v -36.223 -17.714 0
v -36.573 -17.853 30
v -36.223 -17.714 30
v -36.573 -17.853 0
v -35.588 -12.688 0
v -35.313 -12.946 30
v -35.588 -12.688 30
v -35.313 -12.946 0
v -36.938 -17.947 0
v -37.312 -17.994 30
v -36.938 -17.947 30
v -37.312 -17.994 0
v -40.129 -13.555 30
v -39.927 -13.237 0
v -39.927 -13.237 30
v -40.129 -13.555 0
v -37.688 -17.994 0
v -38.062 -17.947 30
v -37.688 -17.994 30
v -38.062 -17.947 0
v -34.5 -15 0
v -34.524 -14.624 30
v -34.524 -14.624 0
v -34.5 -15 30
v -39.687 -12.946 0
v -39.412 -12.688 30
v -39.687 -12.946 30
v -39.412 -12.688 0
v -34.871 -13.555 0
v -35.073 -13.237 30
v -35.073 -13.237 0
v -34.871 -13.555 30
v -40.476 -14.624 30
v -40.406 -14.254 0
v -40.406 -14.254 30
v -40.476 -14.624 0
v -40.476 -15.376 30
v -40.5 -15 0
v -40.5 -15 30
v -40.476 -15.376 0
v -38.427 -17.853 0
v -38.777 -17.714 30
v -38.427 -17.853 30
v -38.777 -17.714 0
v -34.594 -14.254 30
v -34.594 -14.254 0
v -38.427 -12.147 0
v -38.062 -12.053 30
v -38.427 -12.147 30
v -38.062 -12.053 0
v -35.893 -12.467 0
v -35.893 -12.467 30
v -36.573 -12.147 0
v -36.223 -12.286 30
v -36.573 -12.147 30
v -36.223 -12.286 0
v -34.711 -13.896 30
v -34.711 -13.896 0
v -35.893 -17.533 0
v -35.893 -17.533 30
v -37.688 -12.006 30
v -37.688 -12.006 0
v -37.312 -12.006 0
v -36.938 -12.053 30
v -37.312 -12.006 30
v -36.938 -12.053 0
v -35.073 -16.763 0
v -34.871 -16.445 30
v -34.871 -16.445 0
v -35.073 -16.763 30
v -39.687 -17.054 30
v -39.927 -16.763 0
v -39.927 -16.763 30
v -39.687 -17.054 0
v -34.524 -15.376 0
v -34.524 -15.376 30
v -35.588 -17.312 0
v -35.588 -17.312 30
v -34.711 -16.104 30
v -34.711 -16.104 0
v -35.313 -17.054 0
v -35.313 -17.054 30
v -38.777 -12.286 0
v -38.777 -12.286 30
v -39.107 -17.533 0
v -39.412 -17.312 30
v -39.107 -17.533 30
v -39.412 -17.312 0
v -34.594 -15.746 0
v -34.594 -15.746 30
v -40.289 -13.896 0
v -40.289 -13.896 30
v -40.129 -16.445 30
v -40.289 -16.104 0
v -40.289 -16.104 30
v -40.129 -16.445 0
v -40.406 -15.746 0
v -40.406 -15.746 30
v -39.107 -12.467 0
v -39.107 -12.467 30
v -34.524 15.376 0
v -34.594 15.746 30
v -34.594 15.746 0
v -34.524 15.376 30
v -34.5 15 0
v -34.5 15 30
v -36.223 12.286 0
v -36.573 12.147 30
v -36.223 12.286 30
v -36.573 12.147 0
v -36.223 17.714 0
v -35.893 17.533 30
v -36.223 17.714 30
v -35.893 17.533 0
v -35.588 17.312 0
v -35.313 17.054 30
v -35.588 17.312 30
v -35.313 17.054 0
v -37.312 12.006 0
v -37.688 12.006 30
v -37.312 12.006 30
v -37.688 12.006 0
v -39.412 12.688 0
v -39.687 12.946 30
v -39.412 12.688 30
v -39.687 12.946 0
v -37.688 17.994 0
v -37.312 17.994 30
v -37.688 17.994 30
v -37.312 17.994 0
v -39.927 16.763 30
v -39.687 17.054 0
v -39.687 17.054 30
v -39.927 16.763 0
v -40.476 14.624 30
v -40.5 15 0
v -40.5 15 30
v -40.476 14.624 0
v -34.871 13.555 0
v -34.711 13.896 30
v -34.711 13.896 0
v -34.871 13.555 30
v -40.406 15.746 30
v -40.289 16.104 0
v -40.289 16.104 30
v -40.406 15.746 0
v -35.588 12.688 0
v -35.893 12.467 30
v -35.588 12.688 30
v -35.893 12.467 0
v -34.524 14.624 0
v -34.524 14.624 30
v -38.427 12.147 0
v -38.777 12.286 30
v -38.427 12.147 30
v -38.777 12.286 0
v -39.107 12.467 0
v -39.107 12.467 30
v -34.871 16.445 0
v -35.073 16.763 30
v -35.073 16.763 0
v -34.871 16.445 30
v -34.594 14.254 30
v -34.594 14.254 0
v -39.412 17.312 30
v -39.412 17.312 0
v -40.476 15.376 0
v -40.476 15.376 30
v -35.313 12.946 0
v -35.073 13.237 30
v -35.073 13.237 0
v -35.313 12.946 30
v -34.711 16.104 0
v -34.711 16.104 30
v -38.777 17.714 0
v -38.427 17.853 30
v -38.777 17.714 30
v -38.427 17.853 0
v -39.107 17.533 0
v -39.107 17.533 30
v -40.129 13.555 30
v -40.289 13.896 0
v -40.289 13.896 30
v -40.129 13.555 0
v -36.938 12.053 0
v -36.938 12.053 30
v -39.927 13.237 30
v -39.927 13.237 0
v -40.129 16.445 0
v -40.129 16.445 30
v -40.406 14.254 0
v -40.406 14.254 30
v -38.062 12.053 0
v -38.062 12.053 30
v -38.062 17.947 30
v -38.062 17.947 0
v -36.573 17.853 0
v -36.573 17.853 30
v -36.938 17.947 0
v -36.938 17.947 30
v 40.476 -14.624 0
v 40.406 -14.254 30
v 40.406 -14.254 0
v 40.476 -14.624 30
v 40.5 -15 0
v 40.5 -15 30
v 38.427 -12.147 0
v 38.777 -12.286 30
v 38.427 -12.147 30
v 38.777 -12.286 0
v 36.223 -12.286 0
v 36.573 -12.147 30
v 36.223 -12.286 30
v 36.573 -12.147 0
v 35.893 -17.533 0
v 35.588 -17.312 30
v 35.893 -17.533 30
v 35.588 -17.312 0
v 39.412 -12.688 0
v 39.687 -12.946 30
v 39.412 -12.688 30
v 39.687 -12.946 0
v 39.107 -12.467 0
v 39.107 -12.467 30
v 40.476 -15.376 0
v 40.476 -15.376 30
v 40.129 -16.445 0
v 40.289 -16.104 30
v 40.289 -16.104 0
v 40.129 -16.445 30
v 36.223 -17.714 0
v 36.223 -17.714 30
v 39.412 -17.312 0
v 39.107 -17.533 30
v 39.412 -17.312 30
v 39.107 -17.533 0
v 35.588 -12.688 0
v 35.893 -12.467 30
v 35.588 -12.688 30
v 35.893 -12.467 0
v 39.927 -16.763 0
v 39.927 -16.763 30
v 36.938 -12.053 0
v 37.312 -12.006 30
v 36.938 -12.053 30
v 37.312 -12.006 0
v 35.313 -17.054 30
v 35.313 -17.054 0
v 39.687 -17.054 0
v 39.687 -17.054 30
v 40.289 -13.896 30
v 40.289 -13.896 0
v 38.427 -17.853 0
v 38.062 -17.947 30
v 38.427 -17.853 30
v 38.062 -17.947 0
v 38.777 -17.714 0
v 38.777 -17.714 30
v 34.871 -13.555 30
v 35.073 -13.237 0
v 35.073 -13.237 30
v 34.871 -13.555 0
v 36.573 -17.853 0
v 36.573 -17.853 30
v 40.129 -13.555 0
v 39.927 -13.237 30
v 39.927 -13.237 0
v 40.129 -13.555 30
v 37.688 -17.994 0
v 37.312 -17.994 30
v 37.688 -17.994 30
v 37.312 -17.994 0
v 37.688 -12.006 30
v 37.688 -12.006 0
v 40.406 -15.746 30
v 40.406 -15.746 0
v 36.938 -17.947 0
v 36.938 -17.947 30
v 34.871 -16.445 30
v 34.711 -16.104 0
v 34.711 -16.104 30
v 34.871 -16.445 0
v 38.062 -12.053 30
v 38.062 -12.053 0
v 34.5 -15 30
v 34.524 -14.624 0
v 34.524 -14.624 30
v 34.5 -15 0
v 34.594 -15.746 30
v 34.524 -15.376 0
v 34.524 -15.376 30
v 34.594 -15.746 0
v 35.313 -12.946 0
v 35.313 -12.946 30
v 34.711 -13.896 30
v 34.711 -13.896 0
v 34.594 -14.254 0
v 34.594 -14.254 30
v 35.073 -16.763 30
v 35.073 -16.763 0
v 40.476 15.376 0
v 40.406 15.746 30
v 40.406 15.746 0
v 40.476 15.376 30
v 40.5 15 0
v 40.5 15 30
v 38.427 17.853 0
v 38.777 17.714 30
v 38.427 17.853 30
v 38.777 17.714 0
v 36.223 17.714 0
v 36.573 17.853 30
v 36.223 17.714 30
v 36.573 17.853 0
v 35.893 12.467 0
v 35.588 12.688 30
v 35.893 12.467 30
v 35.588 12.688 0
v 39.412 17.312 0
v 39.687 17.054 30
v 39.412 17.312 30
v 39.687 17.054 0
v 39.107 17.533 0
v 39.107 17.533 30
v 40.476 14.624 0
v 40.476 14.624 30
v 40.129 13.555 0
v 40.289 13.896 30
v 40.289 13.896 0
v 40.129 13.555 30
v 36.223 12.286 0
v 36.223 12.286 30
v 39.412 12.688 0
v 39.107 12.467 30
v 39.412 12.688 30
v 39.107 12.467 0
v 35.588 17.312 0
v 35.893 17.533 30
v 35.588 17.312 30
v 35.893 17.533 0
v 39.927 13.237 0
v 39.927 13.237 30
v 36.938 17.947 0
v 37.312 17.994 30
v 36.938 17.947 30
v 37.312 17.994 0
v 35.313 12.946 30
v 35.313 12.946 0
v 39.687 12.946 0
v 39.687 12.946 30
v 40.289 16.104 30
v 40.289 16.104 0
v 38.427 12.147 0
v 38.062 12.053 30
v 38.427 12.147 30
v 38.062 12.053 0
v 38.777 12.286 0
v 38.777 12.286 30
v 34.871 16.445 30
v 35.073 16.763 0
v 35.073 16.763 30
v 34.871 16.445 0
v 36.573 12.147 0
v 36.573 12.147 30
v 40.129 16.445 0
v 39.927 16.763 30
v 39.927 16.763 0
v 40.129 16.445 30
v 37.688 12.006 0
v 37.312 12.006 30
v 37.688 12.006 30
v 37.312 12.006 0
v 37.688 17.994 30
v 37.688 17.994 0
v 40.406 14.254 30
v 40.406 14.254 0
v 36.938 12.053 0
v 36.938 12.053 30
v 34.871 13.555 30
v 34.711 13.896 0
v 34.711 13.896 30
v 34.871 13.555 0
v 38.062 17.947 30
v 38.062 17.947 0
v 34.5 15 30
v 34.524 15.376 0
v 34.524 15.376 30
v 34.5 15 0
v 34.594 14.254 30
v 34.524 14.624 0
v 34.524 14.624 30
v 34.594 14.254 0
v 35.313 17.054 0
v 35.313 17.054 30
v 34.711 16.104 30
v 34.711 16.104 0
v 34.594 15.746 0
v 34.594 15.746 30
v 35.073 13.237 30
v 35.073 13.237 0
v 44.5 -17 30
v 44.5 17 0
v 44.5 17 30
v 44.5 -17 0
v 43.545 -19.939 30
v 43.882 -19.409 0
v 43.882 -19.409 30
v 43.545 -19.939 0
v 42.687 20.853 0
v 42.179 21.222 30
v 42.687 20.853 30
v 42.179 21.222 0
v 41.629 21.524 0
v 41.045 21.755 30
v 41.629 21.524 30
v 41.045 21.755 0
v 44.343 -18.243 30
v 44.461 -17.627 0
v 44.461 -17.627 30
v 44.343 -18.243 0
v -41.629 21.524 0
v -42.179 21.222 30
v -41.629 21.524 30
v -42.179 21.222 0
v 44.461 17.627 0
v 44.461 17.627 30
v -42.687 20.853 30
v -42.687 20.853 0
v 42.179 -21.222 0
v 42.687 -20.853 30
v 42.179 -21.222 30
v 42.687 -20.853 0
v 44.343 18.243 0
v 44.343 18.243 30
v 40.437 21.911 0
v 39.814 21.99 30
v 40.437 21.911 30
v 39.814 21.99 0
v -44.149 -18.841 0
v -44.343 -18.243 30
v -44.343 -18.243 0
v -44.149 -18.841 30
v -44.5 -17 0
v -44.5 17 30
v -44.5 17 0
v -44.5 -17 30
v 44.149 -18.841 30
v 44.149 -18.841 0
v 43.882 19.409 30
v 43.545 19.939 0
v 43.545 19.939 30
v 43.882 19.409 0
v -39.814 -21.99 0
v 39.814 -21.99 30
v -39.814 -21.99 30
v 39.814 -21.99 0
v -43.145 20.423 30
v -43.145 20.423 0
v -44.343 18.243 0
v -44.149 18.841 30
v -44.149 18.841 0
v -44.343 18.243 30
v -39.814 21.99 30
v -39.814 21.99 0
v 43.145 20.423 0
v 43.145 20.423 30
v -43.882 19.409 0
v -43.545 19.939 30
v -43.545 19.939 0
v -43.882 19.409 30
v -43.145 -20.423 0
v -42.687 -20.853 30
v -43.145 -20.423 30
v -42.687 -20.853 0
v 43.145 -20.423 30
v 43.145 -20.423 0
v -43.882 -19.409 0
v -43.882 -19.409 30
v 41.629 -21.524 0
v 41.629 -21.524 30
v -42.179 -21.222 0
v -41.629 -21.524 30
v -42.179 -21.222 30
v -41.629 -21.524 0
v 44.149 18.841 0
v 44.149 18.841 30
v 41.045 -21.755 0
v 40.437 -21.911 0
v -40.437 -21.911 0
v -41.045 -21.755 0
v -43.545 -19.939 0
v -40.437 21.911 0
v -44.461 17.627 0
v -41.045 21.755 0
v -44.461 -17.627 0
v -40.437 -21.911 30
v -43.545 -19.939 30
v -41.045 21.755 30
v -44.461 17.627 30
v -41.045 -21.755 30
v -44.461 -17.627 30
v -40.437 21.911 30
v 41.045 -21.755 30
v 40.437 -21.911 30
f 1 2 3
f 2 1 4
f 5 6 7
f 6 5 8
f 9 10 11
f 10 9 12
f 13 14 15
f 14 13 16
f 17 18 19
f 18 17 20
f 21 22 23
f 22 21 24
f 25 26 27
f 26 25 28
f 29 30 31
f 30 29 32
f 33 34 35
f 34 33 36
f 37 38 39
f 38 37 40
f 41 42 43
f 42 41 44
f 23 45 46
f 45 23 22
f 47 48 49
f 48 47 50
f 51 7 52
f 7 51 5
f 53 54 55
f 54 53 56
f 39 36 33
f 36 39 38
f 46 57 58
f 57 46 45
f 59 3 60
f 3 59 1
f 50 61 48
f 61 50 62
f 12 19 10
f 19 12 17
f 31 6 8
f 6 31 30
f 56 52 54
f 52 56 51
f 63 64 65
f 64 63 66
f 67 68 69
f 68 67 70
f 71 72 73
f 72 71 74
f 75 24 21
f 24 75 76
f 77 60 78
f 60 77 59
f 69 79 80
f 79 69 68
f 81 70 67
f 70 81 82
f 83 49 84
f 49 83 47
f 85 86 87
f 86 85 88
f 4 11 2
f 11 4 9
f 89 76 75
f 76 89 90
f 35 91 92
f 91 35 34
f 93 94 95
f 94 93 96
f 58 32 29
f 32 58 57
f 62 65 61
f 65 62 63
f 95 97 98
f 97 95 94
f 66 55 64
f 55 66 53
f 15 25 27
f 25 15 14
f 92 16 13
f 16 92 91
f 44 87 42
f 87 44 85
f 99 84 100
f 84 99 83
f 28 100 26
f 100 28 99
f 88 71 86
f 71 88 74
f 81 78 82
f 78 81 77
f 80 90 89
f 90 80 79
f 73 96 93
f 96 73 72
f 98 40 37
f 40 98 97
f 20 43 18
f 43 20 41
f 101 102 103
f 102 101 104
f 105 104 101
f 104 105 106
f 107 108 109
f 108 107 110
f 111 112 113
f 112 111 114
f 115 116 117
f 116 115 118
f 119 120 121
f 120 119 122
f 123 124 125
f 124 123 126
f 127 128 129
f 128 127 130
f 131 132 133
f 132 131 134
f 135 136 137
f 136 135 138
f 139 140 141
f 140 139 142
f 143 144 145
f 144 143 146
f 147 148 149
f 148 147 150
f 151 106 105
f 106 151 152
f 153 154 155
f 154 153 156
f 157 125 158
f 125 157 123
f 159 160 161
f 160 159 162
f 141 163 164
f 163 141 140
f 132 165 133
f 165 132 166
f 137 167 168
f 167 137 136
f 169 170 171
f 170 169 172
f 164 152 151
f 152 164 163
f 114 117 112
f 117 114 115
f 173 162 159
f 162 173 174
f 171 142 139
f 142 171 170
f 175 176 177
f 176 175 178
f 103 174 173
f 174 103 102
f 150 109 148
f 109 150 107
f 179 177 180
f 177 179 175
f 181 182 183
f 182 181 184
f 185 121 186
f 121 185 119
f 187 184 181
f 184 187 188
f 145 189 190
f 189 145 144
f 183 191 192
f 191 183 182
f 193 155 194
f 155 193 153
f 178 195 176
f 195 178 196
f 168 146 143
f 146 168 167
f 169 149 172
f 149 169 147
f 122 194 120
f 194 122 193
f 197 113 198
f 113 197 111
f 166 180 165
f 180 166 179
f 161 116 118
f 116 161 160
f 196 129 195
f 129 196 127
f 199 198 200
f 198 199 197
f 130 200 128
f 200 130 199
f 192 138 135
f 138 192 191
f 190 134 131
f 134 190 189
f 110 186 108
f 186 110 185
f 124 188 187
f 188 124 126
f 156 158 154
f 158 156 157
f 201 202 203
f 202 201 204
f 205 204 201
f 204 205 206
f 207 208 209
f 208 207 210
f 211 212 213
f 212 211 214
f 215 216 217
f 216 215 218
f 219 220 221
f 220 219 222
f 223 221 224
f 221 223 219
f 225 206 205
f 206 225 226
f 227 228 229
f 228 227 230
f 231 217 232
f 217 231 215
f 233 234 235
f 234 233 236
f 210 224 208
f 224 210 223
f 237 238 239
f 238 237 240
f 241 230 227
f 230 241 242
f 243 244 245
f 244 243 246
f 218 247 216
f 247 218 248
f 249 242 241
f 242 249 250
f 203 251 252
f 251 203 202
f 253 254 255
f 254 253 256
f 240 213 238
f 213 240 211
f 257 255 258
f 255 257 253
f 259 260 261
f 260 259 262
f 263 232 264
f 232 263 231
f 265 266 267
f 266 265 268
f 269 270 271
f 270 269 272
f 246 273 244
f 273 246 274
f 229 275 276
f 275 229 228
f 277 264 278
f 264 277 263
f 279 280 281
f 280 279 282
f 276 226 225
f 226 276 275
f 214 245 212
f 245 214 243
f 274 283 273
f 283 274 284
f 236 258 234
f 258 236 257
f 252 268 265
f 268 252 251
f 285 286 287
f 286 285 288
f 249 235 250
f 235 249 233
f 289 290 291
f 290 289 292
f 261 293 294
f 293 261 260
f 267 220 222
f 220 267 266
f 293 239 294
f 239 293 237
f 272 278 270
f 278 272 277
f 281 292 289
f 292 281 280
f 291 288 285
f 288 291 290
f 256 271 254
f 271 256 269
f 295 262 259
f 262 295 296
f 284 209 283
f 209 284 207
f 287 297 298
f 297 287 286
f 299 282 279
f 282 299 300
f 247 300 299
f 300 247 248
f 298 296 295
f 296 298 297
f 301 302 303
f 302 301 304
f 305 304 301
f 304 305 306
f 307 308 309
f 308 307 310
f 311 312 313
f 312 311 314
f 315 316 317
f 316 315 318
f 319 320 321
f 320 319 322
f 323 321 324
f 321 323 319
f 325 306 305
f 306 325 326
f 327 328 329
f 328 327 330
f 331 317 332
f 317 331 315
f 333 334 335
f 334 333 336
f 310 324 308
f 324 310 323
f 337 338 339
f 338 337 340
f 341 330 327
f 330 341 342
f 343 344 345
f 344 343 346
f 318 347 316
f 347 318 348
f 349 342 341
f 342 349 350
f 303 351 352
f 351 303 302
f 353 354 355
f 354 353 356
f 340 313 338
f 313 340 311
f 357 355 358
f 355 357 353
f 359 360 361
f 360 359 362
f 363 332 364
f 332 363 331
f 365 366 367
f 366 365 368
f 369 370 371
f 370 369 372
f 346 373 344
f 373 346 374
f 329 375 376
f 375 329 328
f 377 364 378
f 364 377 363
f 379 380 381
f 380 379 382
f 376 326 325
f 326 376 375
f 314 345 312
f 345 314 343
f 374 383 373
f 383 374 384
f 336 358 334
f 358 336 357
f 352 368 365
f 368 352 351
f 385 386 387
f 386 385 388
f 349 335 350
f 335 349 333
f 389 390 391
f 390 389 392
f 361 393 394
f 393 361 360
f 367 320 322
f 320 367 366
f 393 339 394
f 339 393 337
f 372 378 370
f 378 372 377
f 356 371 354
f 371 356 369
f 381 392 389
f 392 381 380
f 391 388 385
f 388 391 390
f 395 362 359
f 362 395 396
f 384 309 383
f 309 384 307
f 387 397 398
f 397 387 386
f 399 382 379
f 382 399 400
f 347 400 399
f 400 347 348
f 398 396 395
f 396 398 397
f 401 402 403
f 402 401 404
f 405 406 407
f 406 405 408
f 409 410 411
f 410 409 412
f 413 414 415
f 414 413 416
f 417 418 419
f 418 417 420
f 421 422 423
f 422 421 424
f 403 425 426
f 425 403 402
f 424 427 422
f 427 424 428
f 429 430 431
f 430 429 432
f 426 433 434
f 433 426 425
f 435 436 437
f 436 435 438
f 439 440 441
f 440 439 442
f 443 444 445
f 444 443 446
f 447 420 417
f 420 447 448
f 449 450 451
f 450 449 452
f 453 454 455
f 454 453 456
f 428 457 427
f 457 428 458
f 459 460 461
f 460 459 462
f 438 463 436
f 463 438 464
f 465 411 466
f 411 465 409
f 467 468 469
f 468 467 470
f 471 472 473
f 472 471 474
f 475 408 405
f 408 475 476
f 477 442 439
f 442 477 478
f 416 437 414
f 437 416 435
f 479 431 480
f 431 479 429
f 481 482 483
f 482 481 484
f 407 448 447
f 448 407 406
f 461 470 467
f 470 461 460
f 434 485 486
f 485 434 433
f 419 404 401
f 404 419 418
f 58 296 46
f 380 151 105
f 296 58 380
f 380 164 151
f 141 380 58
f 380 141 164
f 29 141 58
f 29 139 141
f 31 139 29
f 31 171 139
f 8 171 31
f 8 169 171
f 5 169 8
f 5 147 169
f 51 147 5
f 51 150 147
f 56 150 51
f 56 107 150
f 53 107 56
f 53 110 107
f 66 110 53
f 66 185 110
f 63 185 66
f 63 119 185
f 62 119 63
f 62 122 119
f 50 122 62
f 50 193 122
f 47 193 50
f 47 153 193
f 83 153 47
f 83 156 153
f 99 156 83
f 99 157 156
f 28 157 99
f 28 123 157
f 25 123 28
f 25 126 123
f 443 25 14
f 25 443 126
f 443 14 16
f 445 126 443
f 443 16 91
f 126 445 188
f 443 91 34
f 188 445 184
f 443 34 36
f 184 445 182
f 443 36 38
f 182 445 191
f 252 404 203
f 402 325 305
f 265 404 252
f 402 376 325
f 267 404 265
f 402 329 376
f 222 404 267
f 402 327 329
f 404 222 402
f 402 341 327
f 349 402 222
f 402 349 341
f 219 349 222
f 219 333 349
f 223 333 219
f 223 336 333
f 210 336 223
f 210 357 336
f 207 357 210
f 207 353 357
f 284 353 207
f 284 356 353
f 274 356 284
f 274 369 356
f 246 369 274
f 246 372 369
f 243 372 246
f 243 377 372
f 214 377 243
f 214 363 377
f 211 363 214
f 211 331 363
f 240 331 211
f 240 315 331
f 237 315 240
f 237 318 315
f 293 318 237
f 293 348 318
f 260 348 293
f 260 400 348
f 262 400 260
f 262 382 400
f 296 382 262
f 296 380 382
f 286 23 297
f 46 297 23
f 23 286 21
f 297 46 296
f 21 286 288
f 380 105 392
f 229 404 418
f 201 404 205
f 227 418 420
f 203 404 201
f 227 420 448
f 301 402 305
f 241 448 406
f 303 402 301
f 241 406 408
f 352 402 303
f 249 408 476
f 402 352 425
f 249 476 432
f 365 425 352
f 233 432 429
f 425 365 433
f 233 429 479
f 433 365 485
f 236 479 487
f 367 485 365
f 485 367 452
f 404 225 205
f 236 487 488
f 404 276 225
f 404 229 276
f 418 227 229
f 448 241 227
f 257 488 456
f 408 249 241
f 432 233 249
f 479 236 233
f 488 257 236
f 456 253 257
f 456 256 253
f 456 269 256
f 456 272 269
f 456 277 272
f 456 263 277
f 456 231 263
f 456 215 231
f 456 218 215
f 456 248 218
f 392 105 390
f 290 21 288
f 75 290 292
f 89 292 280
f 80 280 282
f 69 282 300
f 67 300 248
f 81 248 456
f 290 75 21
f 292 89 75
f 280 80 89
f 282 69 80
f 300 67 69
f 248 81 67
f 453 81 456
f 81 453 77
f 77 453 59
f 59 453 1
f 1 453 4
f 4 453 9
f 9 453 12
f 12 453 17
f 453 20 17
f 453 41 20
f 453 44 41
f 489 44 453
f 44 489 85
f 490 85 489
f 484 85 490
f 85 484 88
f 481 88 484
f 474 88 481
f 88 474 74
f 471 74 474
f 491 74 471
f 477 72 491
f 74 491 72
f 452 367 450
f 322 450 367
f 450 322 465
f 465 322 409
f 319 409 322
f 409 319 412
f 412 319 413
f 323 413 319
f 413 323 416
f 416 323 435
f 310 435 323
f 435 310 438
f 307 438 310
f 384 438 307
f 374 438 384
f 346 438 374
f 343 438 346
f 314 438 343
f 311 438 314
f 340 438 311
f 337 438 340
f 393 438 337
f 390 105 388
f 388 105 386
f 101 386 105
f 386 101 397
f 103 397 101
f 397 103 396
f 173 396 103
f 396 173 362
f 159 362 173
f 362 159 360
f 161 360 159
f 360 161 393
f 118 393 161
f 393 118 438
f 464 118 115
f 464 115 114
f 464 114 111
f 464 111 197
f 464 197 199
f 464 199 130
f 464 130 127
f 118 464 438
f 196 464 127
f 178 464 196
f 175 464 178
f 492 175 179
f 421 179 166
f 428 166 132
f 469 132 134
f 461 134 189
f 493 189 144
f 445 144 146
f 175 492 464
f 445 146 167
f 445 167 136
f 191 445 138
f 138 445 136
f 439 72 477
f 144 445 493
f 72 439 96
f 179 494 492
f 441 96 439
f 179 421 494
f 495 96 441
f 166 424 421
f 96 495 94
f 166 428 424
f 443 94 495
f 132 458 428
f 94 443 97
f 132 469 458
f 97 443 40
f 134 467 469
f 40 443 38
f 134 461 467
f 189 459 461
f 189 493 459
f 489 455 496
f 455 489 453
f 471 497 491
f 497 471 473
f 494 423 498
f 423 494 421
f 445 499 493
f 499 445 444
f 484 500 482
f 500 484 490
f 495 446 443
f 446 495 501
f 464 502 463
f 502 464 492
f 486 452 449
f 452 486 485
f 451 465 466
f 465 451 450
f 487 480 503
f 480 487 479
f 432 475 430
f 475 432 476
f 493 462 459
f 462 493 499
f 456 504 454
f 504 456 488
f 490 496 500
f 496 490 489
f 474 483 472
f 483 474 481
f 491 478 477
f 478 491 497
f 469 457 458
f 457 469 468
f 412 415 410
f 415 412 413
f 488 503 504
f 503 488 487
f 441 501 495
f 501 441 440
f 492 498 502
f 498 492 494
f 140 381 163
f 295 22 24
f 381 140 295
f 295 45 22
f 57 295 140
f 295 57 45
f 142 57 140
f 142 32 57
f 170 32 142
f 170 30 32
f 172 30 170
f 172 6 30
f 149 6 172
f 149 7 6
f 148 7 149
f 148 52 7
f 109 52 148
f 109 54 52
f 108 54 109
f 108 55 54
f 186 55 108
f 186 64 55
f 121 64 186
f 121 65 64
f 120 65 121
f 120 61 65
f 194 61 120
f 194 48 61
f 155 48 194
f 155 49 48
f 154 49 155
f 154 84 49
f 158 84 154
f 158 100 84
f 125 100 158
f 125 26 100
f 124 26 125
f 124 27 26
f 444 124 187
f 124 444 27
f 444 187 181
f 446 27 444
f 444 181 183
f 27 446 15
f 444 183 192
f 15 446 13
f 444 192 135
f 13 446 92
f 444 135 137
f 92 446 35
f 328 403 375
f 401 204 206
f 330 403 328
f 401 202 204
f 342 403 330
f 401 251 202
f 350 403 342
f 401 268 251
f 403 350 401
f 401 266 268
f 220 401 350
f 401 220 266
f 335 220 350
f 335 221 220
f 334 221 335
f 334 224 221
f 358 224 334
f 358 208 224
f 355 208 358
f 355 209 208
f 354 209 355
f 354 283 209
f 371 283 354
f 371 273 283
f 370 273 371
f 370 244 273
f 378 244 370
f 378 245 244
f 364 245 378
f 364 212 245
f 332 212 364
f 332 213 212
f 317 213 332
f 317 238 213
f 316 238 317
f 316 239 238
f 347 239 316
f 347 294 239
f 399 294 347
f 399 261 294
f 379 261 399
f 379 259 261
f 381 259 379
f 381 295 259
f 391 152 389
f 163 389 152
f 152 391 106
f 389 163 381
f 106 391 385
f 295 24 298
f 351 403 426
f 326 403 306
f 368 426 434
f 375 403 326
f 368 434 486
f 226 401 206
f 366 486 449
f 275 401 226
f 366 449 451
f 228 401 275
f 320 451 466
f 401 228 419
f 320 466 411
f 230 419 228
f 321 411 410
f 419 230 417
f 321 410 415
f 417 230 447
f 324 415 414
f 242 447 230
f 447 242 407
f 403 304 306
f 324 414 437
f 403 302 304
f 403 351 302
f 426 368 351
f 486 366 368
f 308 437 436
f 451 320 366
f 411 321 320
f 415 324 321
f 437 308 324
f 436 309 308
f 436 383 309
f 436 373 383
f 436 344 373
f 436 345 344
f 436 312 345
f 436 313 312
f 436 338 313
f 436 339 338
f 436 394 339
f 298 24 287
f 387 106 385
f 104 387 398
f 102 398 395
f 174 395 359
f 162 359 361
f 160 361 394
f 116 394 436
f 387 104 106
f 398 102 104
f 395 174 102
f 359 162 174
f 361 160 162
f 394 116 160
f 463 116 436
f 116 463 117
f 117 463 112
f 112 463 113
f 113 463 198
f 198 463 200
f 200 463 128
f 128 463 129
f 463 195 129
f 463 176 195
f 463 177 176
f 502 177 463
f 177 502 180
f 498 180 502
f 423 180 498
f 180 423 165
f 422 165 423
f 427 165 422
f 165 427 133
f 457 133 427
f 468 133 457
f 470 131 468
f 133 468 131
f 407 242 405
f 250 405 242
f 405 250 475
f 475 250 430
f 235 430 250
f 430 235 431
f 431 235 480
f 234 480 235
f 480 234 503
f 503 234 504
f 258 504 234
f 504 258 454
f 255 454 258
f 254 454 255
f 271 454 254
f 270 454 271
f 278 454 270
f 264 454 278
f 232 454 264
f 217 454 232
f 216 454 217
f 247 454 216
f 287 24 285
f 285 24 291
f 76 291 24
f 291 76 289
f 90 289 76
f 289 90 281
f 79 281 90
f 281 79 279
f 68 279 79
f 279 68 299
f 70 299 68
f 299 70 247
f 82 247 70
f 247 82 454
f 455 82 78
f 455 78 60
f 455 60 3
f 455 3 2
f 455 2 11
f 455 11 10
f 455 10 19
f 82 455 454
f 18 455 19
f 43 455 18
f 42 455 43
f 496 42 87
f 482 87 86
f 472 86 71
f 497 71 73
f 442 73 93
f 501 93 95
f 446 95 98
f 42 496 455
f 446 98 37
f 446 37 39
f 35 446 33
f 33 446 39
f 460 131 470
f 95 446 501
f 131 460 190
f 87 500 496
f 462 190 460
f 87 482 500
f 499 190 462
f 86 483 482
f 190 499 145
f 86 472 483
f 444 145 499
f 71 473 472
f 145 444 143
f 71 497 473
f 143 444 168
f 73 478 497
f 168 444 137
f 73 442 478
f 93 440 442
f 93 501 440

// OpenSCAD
$fn = 50;


difference() {
	union() {
		hull() {
			translate(v = [-39.5000000000, 17.0000000000, 0]) {
				cylinder(h = 30, r = 5);
			}
			translate(v = [39.5000000000, 17.0000000000, 0]) {
				cylinder(h = 30, r = 5);
			}
			translate(v = [-39.5000000000, -17.0000000000, 0]) {
				cylinder(h = 30, r = 5);
			}
			translate(v = [39.5000000000, -17.0000000000, 0]) {
				cylinder(h = 30, r = 5);
			}
		}
	}
	union() {
		translate(v = [-37.5000000000, -15.0000000000, -100.0000000000]) {
			cylinder(h = 200, r = 3.0000000000);
		}
		translate(v = [-37.5000000000, 15.0000000000, -100.0000000000]) {
			cylinder(h = 200, r = 3.0000000000);
		}
		translate(v = [37.5000000000, -15.0000000000, -100.0000000000]) {
			cylinder(h = 200, r = 3.0000000000);
		}
		translate(v = [37.5000000000, 15.0000000000, -100.0000000000]) {
			cylinder(h = 200, r = 3.0000000000);
		}
	}
}
